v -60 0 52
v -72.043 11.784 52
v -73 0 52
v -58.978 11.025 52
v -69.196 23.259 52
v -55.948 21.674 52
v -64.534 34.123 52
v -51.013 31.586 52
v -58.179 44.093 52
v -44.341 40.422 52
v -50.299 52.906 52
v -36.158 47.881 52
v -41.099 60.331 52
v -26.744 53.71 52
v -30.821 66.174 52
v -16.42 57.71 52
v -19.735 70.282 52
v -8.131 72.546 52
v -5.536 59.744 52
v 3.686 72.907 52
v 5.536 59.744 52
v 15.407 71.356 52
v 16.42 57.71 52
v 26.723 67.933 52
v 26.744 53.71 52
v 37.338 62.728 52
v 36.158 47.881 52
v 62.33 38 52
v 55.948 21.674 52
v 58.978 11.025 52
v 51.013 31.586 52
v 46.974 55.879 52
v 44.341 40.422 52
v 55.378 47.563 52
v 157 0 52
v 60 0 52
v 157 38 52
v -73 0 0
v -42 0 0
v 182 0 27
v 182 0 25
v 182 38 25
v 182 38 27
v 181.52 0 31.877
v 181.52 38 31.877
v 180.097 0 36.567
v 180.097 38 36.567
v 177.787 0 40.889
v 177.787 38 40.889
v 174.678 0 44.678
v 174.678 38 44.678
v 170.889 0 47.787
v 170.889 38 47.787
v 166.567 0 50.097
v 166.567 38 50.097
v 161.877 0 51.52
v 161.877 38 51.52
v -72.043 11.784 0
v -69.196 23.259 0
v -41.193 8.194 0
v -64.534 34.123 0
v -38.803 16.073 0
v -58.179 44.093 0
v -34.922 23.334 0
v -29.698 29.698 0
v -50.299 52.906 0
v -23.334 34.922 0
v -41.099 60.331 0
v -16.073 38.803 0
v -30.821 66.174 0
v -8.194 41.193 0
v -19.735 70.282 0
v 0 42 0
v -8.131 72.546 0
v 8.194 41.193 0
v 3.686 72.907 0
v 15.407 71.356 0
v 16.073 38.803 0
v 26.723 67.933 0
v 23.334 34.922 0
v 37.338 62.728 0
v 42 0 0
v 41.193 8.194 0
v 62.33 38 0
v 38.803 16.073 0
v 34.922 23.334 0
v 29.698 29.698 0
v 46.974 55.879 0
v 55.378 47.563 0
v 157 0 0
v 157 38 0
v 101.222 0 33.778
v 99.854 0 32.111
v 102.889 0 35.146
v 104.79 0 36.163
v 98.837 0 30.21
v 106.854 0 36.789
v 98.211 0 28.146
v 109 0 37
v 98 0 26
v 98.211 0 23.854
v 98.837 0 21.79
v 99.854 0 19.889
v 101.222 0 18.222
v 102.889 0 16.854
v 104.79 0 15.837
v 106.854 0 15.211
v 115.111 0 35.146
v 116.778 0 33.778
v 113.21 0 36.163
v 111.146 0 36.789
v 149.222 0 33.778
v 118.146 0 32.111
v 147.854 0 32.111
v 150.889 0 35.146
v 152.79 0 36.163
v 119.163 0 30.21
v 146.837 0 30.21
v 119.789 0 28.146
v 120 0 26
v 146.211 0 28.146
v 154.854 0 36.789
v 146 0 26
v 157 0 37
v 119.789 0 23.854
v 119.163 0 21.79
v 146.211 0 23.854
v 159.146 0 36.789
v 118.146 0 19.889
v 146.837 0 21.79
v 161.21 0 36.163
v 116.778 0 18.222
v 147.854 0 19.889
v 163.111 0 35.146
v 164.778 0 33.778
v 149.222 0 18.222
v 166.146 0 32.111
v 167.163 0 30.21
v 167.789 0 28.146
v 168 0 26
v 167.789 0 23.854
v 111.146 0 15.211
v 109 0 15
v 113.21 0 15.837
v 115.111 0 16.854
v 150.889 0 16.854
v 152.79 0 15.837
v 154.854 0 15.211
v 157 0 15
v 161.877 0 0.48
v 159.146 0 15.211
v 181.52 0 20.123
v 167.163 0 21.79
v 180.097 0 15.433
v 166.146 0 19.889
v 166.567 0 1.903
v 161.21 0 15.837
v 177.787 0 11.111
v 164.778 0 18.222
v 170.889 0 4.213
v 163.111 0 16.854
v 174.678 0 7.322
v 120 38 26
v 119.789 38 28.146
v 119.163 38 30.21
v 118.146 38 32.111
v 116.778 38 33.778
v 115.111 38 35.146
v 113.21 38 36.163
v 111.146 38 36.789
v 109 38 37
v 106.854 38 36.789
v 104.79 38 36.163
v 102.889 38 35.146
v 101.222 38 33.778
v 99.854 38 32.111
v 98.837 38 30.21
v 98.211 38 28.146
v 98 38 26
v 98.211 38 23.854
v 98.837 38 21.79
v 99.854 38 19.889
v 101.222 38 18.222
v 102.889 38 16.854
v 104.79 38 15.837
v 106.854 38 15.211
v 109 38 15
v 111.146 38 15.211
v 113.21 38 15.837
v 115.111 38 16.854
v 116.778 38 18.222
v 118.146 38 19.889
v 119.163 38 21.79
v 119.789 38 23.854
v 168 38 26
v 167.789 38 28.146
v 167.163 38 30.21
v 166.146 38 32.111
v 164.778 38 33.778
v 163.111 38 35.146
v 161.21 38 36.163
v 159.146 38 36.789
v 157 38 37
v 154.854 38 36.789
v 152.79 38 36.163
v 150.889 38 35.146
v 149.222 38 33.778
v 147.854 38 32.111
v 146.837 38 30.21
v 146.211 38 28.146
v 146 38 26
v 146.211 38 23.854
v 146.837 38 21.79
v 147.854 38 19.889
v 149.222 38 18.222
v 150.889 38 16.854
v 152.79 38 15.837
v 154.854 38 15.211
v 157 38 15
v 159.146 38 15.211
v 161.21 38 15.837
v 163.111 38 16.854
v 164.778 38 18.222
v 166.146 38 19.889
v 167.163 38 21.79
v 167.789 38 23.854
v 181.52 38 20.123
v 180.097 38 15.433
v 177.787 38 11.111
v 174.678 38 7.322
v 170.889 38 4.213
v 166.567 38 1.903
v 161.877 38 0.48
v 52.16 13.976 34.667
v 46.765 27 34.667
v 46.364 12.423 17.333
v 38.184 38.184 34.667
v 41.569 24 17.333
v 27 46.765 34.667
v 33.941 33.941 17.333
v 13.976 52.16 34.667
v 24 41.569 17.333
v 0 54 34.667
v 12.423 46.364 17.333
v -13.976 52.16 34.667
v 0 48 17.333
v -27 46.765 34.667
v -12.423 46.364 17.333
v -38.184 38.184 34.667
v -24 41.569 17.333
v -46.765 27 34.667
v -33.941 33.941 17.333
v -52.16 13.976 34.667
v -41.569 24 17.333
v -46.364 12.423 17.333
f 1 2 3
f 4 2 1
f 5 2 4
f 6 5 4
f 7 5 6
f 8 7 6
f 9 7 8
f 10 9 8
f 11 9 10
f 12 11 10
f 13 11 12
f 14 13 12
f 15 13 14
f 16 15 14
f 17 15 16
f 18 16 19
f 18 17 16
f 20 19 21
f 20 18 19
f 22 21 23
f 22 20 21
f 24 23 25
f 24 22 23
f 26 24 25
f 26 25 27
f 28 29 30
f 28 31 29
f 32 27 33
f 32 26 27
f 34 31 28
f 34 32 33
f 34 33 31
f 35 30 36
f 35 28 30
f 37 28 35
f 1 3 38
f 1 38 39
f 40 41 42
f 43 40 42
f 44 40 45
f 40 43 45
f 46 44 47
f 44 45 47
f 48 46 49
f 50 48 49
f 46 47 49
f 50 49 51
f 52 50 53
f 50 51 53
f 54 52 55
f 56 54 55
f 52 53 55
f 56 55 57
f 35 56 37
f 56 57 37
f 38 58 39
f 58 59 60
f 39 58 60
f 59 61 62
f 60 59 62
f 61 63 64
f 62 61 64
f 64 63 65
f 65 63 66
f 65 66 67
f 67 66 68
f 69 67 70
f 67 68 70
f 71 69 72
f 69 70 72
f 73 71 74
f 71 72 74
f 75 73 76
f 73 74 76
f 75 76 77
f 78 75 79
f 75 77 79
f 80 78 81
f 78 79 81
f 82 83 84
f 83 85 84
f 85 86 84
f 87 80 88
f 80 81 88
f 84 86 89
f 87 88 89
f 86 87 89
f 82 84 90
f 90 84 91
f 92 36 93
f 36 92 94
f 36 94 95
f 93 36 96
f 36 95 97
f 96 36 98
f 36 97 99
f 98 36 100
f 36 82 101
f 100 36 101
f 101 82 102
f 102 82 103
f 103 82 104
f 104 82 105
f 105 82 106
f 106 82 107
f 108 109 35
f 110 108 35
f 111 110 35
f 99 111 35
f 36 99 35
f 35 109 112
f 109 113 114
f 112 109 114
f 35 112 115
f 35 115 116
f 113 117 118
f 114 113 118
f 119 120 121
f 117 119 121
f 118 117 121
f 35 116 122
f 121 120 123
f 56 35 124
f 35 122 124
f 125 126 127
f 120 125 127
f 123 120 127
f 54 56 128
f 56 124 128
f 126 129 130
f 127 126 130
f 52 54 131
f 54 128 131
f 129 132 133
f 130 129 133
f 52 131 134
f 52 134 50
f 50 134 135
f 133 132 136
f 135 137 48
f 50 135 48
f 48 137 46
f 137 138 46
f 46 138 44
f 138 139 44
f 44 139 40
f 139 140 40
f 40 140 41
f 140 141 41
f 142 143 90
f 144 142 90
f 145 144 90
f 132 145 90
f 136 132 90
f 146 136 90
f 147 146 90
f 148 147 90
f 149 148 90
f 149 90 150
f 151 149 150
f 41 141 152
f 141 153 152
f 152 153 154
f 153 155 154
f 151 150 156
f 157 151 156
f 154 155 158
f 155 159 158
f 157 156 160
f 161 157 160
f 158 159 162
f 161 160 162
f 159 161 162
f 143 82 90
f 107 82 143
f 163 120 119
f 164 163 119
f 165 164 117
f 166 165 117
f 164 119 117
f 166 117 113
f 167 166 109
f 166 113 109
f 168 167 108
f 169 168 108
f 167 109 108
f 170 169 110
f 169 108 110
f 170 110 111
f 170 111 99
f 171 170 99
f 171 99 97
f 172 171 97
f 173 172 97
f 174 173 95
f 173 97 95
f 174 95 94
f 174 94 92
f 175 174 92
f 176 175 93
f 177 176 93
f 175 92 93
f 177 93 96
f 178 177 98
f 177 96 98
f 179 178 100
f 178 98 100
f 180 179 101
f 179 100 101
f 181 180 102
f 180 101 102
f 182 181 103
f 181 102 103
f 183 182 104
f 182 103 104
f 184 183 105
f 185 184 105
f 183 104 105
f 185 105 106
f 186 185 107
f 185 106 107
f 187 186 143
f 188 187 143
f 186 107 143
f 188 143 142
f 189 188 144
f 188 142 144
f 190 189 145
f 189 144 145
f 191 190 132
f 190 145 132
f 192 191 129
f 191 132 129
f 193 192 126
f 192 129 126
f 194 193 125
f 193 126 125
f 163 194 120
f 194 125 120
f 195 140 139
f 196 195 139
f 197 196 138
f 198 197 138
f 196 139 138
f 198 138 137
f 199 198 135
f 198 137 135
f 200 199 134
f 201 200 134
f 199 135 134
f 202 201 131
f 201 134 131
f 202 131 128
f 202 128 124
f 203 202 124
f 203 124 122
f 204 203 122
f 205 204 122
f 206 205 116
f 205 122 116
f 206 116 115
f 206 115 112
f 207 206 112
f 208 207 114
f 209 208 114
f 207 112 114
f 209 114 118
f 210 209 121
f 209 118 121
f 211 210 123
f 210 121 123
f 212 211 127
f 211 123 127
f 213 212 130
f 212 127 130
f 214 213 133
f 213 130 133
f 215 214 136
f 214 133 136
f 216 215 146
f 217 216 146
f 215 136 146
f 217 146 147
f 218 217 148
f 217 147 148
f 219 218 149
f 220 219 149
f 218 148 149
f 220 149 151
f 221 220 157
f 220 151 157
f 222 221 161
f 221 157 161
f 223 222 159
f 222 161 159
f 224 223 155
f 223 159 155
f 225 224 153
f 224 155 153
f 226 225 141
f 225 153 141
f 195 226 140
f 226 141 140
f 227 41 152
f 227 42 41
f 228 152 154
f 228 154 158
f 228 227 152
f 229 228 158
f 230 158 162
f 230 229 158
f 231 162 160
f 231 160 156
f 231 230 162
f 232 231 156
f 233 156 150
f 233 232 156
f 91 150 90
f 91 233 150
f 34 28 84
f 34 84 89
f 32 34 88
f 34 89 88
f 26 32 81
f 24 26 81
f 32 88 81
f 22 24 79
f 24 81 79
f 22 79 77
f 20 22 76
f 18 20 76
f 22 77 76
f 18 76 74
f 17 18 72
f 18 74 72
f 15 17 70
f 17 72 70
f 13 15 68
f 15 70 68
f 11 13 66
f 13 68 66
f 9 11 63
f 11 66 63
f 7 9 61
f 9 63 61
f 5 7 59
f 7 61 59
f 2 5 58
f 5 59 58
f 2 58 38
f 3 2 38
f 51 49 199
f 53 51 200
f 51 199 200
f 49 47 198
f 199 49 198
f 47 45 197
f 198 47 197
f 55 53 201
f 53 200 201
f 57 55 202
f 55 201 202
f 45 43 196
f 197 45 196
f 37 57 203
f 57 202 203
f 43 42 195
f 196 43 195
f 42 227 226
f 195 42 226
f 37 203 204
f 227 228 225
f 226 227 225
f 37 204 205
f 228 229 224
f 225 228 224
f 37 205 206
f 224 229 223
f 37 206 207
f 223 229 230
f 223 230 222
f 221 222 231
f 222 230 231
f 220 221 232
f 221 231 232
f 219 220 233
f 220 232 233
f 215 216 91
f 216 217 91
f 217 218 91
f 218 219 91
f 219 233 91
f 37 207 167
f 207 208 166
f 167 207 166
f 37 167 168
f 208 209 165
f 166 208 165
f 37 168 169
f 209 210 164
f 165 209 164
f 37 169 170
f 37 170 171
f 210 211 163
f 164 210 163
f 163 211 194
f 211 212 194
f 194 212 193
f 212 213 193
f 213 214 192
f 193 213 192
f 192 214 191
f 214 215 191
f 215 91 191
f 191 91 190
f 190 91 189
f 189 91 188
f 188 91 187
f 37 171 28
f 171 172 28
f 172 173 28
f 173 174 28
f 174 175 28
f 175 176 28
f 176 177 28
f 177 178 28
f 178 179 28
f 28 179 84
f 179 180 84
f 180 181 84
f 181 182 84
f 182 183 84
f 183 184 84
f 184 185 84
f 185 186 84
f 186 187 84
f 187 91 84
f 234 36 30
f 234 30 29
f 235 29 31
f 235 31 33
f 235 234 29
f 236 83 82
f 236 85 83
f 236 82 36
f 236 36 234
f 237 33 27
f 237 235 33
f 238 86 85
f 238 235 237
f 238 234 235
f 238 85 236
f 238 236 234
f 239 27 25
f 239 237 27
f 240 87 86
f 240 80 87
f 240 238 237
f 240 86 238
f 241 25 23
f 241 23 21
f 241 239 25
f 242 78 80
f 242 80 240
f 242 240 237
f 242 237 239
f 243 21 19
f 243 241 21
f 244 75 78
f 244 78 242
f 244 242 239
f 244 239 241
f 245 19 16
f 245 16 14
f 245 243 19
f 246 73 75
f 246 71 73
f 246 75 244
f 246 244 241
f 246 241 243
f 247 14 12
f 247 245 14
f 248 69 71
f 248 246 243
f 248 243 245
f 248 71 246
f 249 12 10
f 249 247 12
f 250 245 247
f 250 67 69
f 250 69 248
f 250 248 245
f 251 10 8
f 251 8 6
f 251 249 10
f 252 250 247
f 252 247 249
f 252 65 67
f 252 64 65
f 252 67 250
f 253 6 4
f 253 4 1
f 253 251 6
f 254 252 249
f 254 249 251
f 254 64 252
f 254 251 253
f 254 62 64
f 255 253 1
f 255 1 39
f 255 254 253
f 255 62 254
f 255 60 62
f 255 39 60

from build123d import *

# Parameters (mm, degrees)
F1_DEPTH = 52
F2_R     = 11
F3_DEPTH = 38
F6_R     = 25


with BuildPart() as f1:
    # F0 (on Top) → F1 (new body)
    with BuildSketch(Plane.XY):
        with BuildLine():
            Line((182, 38), (62.329768, 38))
            ThreePointArc((62.329768, 38), (-19.734829, 70.281836), (-73, 0))
            Line((-73, 0), (182, 0))
            Line((182, 0), (182, 38))
        make_face()
    extrude(amount=F1_DEPTH)

    # F2 (on face) → F3 (cut)
    with BuildSketch(Plane.XZ):
        with Locations((109, 26)):
            Circle(F2_R)
        with Locations((157, 26)):
            Circle(F2_R)
    extrude(amount=-F3_DEPTH, mode=Mode.SUBTRACT)

    # F4 (on face) → F5 (revolve, cut)
    with BuildSketch(Plane.XZ):
        Polygon((0, 0), (0, 52), (-60, 52), (-42, 0), align=None)
    revolve(axis=Axis((0, 0, 26), (0, 0, 1)), mode=Mode.SUBTRACT)

    # F6
    f6_edges = [f1.edges().sort_by_distance(p)[0] for p in [
        (182, 19, 52),
        (182, 19, 0),
    ]]
    fillet(f6_edges, radius=F6_R)


solid = f1.part
